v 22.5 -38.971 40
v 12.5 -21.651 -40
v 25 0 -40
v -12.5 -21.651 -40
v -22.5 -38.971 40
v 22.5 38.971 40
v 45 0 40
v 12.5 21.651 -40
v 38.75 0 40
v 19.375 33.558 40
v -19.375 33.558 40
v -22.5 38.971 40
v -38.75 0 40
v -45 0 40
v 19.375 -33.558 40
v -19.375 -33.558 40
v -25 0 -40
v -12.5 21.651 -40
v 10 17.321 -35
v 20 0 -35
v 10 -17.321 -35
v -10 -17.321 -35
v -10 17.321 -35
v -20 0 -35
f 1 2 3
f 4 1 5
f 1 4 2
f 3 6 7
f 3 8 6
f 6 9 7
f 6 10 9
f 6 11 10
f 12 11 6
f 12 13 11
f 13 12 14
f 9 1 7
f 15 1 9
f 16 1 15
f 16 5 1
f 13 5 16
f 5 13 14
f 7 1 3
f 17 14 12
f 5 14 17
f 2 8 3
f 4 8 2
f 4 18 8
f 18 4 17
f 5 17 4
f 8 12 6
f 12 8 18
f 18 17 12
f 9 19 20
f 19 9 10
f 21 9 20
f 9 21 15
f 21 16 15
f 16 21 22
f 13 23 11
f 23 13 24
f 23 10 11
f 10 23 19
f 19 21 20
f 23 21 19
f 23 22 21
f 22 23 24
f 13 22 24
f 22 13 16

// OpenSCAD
//--Portalápices Paramétrico de base poligonal

//--Unidades en mm.www.Bioplastic3d.es

//--Parametros


Numero_Lados=6;
Diametro_Inferior=50;
Diametro_Superior=90;
Altura=80;
Grosor=5;




//--Booleana

difference(){

//--Superficie Exterior
cylinder ( r1=Diametro_Inferior/2, r2=Diametro_Superior/2,h=Altura,$fn=Numero_Lados,center=true);

//--Superficie a Sustraer

translate([0,0,Grosor])
cylinder ( r1=Diametro_Inferior/2 - Grosor, r2=Diametro_Superior/2- Grosor,h=Altura,$fn=Numero_Lados,center=true);}
